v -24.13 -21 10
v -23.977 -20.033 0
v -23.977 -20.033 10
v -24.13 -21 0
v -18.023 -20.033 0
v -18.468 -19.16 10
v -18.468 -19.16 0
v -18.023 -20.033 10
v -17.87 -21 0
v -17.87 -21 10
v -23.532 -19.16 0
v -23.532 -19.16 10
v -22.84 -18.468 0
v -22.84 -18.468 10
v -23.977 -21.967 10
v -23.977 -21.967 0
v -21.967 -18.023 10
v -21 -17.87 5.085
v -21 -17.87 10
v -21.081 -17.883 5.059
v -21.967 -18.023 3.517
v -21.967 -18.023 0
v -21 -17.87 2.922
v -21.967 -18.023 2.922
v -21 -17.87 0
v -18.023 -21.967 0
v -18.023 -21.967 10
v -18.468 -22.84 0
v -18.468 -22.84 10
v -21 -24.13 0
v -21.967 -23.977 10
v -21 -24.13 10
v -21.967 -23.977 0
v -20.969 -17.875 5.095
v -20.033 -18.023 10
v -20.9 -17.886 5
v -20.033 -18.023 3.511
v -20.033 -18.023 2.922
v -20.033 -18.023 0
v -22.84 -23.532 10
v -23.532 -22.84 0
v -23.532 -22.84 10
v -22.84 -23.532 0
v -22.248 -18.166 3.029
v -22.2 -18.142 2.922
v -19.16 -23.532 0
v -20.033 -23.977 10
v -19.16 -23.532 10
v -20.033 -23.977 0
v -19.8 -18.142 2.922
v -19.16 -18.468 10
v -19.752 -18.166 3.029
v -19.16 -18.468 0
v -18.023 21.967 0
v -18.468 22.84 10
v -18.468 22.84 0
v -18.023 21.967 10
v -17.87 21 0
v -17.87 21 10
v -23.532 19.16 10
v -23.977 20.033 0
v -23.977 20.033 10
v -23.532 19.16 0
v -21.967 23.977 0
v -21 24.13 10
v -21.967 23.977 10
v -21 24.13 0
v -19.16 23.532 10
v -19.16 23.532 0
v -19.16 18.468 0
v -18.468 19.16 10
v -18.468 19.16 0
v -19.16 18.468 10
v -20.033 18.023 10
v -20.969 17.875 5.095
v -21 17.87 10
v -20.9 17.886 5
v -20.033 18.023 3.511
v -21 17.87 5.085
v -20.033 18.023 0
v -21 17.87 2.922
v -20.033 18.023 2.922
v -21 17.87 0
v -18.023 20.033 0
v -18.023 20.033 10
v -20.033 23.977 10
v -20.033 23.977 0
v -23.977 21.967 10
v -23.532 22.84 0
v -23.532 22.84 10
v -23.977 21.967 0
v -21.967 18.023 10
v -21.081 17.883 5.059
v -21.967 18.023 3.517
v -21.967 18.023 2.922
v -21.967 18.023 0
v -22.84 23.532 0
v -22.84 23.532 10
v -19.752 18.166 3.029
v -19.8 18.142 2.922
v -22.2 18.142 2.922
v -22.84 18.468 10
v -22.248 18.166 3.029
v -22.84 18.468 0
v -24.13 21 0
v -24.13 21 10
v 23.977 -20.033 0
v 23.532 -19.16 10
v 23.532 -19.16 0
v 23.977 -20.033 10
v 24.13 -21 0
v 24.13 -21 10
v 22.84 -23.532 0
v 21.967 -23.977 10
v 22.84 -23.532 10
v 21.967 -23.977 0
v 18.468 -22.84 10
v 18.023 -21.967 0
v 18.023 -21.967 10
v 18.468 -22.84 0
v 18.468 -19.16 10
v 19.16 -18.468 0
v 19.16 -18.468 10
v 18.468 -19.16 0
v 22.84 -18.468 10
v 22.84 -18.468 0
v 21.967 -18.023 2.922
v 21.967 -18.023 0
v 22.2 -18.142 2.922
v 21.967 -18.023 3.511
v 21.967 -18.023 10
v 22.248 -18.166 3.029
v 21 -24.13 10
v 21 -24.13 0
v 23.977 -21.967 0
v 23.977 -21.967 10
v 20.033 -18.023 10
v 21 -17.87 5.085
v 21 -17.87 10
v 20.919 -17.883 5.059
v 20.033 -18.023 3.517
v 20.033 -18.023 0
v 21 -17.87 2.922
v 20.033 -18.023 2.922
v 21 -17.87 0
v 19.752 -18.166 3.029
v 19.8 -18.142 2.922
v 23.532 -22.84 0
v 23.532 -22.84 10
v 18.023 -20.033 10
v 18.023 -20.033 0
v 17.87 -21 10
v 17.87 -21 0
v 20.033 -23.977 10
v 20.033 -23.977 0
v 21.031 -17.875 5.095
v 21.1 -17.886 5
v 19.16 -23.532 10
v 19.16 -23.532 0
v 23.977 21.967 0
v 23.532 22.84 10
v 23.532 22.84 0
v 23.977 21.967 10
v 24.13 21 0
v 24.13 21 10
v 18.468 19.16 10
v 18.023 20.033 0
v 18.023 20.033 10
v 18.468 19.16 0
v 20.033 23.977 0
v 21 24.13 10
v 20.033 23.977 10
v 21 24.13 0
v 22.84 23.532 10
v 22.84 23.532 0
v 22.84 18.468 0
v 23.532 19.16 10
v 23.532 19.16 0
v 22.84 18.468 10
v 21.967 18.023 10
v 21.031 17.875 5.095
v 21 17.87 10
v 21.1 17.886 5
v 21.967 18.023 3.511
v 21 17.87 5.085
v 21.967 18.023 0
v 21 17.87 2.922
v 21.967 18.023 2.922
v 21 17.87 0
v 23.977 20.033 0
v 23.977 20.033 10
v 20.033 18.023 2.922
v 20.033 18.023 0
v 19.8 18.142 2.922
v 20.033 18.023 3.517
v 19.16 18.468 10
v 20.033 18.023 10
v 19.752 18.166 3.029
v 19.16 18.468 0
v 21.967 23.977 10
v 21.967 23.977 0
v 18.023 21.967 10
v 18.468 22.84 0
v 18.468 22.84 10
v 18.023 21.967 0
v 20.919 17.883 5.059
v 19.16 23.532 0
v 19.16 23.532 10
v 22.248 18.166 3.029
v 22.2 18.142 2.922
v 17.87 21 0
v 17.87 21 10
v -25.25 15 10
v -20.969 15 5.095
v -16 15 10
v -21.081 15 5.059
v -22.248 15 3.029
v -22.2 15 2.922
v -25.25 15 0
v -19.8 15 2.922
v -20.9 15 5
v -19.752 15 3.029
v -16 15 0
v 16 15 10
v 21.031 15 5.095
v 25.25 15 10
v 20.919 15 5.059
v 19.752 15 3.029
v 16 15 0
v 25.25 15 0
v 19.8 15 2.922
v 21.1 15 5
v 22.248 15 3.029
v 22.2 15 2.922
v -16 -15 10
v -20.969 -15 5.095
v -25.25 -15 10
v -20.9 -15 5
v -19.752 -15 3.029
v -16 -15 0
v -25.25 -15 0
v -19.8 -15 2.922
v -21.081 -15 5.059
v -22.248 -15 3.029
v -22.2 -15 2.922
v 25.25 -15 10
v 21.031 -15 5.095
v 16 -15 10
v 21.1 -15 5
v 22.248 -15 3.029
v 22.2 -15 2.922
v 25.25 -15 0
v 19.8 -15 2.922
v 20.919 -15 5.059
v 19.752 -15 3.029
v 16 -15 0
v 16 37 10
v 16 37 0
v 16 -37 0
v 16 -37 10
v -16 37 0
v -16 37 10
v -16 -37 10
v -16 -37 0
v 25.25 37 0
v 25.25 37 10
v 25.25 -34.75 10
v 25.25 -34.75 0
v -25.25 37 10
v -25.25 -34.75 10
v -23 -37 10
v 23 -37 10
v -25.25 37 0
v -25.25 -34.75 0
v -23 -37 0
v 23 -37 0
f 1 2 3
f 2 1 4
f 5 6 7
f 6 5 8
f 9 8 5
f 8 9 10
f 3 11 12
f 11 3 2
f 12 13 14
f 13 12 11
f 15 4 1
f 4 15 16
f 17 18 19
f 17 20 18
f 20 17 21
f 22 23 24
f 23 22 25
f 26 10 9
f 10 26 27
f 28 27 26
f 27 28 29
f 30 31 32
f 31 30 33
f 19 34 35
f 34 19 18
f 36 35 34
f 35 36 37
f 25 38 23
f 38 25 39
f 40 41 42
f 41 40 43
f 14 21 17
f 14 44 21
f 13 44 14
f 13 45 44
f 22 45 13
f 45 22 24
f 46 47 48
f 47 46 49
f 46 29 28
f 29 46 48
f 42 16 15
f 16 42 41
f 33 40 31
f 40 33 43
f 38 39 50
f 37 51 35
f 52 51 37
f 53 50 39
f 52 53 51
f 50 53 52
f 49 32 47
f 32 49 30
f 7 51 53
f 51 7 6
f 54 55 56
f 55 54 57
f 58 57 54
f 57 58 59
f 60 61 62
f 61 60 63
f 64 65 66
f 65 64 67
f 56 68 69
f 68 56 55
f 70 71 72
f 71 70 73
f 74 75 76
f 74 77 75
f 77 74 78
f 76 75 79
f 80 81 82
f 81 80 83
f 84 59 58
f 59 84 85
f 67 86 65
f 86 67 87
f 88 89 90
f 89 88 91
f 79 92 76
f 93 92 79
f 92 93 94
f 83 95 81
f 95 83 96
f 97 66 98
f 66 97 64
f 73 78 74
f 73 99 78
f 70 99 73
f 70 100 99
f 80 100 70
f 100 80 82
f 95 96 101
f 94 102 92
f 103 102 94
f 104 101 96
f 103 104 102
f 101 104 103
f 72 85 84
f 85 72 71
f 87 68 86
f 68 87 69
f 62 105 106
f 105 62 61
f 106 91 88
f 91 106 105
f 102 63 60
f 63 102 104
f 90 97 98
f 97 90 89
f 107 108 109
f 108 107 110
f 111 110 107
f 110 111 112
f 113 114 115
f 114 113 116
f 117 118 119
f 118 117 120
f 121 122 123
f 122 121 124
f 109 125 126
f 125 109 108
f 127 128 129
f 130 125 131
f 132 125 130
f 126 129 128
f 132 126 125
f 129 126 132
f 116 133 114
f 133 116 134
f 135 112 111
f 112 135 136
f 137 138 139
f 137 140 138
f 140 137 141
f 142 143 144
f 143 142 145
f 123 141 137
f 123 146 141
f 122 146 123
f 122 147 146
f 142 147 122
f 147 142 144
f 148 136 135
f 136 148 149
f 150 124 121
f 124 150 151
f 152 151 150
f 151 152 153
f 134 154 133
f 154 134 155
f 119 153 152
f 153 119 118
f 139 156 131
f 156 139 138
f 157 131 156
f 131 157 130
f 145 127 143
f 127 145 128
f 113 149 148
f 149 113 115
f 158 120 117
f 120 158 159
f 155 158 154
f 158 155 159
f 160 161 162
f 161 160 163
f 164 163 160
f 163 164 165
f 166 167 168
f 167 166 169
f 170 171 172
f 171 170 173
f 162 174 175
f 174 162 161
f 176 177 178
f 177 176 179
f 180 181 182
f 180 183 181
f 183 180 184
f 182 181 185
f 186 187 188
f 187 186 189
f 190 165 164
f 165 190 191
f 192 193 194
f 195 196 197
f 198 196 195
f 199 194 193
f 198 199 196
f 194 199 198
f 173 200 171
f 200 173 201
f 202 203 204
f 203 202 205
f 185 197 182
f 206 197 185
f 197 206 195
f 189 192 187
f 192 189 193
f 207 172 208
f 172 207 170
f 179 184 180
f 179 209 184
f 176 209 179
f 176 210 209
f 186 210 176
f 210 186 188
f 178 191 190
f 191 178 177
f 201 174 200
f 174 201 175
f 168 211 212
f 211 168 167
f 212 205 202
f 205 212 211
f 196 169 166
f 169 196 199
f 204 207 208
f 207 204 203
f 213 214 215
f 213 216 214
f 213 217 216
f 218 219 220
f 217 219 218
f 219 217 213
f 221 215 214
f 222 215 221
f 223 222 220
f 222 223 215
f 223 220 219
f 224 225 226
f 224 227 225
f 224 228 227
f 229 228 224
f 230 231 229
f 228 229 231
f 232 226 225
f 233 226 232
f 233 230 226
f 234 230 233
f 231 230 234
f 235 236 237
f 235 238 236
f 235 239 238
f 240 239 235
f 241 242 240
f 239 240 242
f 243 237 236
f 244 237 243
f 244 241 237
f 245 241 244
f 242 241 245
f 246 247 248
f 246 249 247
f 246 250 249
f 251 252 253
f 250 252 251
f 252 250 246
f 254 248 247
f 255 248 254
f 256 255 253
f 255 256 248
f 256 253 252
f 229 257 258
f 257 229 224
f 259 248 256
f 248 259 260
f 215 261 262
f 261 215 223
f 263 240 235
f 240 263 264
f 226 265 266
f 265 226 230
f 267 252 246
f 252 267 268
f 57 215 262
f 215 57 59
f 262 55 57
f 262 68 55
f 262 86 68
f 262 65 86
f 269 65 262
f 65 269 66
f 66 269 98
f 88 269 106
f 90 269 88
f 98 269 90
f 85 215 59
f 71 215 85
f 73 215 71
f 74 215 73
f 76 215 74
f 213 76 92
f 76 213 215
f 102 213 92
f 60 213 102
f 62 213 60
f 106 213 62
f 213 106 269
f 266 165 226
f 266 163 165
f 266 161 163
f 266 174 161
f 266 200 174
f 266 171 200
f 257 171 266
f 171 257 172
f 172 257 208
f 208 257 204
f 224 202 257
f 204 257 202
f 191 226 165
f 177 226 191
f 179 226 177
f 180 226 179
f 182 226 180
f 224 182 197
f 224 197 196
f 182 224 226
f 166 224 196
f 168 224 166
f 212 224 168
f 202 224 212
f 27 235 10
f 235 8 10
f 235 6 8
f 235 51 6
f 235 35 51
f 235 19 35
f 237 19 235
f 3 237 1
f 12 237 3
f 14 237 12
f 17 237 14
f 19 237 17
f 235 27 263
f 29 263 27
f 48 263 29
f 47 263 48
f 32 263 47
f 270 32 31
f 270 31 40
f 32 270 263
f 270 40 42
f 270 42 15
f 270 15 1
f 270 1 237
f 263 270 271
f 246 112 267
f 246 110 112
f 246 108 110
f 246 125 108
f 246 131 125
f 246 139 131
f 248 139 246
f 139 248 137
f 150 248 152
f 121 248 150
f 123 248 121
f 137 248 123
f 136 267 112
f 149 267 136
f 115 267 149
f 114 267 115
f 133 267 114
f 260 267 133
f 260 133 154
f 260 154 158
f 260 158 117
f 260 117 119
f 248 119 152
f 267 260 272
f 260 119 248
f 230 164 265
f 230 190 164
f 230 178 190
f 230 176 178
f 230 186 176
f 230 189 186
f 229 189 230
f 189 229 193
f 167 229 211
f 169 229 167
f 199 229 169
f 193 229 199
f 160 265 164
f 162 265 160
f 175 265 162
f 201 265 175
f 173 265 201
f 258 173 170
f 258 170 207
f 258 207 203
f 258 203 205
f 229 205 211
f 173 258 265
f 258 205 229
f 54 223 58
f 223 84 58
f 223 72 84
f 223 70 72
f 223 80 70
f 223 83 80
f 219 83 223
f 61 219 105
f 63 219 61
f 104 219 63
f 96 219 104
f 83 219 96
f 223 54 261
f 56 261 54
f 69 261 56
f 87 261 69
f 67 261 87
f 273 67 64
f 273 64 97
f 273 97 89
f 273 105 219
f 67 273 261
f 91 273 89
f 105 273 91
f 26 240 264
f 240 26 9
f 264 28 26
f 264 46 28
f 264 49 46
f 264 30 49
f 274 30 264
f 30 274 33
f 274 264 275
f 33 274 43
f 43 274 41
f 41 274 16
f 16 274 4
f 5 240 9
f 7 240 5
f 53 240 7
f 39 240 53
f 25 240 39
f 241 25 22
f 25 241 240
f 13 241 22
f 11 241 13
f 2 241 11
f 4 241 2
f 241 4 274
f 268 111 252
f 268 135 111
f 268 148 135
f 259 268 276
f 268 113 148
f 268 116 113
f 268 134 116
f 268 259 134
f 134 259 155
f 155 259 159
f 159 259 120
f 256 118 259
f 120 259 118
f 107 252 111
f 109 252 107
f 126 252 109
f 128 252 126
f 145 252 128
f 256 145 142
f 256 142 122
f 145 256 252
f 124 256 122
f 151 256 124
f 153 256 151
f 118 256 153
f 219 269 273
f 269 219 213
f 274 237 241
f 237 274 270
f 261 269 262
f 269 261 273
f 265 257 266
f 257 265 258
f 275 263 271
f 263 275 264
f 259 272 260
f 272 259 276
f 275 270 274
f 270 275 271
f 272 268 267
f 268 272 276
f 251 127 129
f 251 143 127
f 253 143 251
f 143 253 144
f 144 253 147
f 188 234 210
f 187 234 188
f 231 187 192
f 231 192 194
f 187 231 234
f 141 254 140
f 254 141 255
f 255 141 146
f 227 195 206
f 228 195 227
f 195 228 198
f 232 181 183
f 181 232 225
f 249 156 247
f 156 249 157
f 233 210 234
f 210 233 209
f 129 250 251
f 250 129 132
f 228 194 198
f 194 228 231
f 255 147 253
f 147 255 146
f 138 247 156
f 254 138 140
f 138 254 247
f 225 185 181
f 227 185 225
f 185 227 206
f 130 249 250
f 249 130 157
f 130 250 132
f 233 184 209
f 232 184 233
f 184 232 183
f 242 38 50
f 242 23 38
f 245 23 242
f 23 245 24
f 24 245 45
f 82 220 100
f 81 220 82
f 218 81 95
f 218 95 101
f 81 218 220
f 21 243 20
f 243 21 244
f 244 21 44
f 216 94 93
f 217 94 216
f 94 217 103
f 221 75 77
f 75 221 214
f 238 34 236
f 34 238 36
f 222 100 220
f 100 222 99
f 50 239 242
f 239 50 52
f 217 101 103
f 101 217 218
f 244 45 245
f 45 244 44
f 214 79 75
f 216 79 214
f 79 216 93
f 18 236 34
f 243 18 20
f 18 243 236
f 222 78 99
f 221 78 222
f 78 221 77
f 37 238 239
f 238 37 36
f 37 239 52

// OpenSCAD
module triangle(side_len, prism_len, corner_rad){
    rotate([270,0,0])hull(){
        cylinder(r=corner_rad, h=prism_len);
        rotate([0,0,60])translate([side_len-corner_rad*2,0,0])cylinder(r=corner_rad, h=prism_len);
        rotate([0,0,120])translate([side_len-corner_rad*2,0,0])cylinder(r=corner_rad, h=prism_len);
    }  
}



    cage_size = 21; //42mm / 2
module cage_adapter(){
    difference(){
intersection(){
    $fn=20;
difference(){
 translate([0,0,5]){   
cube([50.5,74,10],center=true);
 }
for(x=[-1*cage_size,cage_size]){
    for(y=[-1*cage_size,cage_size]){
    translate([x,y,-1]){
    cylinder(d=6.26,h=25);//h=12
    }//end translate
}//end for
}//end for
translate([0,0,5]){
cube([55,30,12],center=true);
cube([32,80,12],center=true);
}//end translate
}//end difference

translate([0,-60,0])rotate([0,0,45])cube(100); // a big cube to chop off pesky corners
} // end intersection
union(){
    translate([cage_size,-1*cage_size,5])triangle(2.5,42,0.1);
    translate([-1*cage_size,-1*cage_size,5])triangle(2.5,42,0.1);
}//end union
} //end difference
}//end module


cage_adapter();
